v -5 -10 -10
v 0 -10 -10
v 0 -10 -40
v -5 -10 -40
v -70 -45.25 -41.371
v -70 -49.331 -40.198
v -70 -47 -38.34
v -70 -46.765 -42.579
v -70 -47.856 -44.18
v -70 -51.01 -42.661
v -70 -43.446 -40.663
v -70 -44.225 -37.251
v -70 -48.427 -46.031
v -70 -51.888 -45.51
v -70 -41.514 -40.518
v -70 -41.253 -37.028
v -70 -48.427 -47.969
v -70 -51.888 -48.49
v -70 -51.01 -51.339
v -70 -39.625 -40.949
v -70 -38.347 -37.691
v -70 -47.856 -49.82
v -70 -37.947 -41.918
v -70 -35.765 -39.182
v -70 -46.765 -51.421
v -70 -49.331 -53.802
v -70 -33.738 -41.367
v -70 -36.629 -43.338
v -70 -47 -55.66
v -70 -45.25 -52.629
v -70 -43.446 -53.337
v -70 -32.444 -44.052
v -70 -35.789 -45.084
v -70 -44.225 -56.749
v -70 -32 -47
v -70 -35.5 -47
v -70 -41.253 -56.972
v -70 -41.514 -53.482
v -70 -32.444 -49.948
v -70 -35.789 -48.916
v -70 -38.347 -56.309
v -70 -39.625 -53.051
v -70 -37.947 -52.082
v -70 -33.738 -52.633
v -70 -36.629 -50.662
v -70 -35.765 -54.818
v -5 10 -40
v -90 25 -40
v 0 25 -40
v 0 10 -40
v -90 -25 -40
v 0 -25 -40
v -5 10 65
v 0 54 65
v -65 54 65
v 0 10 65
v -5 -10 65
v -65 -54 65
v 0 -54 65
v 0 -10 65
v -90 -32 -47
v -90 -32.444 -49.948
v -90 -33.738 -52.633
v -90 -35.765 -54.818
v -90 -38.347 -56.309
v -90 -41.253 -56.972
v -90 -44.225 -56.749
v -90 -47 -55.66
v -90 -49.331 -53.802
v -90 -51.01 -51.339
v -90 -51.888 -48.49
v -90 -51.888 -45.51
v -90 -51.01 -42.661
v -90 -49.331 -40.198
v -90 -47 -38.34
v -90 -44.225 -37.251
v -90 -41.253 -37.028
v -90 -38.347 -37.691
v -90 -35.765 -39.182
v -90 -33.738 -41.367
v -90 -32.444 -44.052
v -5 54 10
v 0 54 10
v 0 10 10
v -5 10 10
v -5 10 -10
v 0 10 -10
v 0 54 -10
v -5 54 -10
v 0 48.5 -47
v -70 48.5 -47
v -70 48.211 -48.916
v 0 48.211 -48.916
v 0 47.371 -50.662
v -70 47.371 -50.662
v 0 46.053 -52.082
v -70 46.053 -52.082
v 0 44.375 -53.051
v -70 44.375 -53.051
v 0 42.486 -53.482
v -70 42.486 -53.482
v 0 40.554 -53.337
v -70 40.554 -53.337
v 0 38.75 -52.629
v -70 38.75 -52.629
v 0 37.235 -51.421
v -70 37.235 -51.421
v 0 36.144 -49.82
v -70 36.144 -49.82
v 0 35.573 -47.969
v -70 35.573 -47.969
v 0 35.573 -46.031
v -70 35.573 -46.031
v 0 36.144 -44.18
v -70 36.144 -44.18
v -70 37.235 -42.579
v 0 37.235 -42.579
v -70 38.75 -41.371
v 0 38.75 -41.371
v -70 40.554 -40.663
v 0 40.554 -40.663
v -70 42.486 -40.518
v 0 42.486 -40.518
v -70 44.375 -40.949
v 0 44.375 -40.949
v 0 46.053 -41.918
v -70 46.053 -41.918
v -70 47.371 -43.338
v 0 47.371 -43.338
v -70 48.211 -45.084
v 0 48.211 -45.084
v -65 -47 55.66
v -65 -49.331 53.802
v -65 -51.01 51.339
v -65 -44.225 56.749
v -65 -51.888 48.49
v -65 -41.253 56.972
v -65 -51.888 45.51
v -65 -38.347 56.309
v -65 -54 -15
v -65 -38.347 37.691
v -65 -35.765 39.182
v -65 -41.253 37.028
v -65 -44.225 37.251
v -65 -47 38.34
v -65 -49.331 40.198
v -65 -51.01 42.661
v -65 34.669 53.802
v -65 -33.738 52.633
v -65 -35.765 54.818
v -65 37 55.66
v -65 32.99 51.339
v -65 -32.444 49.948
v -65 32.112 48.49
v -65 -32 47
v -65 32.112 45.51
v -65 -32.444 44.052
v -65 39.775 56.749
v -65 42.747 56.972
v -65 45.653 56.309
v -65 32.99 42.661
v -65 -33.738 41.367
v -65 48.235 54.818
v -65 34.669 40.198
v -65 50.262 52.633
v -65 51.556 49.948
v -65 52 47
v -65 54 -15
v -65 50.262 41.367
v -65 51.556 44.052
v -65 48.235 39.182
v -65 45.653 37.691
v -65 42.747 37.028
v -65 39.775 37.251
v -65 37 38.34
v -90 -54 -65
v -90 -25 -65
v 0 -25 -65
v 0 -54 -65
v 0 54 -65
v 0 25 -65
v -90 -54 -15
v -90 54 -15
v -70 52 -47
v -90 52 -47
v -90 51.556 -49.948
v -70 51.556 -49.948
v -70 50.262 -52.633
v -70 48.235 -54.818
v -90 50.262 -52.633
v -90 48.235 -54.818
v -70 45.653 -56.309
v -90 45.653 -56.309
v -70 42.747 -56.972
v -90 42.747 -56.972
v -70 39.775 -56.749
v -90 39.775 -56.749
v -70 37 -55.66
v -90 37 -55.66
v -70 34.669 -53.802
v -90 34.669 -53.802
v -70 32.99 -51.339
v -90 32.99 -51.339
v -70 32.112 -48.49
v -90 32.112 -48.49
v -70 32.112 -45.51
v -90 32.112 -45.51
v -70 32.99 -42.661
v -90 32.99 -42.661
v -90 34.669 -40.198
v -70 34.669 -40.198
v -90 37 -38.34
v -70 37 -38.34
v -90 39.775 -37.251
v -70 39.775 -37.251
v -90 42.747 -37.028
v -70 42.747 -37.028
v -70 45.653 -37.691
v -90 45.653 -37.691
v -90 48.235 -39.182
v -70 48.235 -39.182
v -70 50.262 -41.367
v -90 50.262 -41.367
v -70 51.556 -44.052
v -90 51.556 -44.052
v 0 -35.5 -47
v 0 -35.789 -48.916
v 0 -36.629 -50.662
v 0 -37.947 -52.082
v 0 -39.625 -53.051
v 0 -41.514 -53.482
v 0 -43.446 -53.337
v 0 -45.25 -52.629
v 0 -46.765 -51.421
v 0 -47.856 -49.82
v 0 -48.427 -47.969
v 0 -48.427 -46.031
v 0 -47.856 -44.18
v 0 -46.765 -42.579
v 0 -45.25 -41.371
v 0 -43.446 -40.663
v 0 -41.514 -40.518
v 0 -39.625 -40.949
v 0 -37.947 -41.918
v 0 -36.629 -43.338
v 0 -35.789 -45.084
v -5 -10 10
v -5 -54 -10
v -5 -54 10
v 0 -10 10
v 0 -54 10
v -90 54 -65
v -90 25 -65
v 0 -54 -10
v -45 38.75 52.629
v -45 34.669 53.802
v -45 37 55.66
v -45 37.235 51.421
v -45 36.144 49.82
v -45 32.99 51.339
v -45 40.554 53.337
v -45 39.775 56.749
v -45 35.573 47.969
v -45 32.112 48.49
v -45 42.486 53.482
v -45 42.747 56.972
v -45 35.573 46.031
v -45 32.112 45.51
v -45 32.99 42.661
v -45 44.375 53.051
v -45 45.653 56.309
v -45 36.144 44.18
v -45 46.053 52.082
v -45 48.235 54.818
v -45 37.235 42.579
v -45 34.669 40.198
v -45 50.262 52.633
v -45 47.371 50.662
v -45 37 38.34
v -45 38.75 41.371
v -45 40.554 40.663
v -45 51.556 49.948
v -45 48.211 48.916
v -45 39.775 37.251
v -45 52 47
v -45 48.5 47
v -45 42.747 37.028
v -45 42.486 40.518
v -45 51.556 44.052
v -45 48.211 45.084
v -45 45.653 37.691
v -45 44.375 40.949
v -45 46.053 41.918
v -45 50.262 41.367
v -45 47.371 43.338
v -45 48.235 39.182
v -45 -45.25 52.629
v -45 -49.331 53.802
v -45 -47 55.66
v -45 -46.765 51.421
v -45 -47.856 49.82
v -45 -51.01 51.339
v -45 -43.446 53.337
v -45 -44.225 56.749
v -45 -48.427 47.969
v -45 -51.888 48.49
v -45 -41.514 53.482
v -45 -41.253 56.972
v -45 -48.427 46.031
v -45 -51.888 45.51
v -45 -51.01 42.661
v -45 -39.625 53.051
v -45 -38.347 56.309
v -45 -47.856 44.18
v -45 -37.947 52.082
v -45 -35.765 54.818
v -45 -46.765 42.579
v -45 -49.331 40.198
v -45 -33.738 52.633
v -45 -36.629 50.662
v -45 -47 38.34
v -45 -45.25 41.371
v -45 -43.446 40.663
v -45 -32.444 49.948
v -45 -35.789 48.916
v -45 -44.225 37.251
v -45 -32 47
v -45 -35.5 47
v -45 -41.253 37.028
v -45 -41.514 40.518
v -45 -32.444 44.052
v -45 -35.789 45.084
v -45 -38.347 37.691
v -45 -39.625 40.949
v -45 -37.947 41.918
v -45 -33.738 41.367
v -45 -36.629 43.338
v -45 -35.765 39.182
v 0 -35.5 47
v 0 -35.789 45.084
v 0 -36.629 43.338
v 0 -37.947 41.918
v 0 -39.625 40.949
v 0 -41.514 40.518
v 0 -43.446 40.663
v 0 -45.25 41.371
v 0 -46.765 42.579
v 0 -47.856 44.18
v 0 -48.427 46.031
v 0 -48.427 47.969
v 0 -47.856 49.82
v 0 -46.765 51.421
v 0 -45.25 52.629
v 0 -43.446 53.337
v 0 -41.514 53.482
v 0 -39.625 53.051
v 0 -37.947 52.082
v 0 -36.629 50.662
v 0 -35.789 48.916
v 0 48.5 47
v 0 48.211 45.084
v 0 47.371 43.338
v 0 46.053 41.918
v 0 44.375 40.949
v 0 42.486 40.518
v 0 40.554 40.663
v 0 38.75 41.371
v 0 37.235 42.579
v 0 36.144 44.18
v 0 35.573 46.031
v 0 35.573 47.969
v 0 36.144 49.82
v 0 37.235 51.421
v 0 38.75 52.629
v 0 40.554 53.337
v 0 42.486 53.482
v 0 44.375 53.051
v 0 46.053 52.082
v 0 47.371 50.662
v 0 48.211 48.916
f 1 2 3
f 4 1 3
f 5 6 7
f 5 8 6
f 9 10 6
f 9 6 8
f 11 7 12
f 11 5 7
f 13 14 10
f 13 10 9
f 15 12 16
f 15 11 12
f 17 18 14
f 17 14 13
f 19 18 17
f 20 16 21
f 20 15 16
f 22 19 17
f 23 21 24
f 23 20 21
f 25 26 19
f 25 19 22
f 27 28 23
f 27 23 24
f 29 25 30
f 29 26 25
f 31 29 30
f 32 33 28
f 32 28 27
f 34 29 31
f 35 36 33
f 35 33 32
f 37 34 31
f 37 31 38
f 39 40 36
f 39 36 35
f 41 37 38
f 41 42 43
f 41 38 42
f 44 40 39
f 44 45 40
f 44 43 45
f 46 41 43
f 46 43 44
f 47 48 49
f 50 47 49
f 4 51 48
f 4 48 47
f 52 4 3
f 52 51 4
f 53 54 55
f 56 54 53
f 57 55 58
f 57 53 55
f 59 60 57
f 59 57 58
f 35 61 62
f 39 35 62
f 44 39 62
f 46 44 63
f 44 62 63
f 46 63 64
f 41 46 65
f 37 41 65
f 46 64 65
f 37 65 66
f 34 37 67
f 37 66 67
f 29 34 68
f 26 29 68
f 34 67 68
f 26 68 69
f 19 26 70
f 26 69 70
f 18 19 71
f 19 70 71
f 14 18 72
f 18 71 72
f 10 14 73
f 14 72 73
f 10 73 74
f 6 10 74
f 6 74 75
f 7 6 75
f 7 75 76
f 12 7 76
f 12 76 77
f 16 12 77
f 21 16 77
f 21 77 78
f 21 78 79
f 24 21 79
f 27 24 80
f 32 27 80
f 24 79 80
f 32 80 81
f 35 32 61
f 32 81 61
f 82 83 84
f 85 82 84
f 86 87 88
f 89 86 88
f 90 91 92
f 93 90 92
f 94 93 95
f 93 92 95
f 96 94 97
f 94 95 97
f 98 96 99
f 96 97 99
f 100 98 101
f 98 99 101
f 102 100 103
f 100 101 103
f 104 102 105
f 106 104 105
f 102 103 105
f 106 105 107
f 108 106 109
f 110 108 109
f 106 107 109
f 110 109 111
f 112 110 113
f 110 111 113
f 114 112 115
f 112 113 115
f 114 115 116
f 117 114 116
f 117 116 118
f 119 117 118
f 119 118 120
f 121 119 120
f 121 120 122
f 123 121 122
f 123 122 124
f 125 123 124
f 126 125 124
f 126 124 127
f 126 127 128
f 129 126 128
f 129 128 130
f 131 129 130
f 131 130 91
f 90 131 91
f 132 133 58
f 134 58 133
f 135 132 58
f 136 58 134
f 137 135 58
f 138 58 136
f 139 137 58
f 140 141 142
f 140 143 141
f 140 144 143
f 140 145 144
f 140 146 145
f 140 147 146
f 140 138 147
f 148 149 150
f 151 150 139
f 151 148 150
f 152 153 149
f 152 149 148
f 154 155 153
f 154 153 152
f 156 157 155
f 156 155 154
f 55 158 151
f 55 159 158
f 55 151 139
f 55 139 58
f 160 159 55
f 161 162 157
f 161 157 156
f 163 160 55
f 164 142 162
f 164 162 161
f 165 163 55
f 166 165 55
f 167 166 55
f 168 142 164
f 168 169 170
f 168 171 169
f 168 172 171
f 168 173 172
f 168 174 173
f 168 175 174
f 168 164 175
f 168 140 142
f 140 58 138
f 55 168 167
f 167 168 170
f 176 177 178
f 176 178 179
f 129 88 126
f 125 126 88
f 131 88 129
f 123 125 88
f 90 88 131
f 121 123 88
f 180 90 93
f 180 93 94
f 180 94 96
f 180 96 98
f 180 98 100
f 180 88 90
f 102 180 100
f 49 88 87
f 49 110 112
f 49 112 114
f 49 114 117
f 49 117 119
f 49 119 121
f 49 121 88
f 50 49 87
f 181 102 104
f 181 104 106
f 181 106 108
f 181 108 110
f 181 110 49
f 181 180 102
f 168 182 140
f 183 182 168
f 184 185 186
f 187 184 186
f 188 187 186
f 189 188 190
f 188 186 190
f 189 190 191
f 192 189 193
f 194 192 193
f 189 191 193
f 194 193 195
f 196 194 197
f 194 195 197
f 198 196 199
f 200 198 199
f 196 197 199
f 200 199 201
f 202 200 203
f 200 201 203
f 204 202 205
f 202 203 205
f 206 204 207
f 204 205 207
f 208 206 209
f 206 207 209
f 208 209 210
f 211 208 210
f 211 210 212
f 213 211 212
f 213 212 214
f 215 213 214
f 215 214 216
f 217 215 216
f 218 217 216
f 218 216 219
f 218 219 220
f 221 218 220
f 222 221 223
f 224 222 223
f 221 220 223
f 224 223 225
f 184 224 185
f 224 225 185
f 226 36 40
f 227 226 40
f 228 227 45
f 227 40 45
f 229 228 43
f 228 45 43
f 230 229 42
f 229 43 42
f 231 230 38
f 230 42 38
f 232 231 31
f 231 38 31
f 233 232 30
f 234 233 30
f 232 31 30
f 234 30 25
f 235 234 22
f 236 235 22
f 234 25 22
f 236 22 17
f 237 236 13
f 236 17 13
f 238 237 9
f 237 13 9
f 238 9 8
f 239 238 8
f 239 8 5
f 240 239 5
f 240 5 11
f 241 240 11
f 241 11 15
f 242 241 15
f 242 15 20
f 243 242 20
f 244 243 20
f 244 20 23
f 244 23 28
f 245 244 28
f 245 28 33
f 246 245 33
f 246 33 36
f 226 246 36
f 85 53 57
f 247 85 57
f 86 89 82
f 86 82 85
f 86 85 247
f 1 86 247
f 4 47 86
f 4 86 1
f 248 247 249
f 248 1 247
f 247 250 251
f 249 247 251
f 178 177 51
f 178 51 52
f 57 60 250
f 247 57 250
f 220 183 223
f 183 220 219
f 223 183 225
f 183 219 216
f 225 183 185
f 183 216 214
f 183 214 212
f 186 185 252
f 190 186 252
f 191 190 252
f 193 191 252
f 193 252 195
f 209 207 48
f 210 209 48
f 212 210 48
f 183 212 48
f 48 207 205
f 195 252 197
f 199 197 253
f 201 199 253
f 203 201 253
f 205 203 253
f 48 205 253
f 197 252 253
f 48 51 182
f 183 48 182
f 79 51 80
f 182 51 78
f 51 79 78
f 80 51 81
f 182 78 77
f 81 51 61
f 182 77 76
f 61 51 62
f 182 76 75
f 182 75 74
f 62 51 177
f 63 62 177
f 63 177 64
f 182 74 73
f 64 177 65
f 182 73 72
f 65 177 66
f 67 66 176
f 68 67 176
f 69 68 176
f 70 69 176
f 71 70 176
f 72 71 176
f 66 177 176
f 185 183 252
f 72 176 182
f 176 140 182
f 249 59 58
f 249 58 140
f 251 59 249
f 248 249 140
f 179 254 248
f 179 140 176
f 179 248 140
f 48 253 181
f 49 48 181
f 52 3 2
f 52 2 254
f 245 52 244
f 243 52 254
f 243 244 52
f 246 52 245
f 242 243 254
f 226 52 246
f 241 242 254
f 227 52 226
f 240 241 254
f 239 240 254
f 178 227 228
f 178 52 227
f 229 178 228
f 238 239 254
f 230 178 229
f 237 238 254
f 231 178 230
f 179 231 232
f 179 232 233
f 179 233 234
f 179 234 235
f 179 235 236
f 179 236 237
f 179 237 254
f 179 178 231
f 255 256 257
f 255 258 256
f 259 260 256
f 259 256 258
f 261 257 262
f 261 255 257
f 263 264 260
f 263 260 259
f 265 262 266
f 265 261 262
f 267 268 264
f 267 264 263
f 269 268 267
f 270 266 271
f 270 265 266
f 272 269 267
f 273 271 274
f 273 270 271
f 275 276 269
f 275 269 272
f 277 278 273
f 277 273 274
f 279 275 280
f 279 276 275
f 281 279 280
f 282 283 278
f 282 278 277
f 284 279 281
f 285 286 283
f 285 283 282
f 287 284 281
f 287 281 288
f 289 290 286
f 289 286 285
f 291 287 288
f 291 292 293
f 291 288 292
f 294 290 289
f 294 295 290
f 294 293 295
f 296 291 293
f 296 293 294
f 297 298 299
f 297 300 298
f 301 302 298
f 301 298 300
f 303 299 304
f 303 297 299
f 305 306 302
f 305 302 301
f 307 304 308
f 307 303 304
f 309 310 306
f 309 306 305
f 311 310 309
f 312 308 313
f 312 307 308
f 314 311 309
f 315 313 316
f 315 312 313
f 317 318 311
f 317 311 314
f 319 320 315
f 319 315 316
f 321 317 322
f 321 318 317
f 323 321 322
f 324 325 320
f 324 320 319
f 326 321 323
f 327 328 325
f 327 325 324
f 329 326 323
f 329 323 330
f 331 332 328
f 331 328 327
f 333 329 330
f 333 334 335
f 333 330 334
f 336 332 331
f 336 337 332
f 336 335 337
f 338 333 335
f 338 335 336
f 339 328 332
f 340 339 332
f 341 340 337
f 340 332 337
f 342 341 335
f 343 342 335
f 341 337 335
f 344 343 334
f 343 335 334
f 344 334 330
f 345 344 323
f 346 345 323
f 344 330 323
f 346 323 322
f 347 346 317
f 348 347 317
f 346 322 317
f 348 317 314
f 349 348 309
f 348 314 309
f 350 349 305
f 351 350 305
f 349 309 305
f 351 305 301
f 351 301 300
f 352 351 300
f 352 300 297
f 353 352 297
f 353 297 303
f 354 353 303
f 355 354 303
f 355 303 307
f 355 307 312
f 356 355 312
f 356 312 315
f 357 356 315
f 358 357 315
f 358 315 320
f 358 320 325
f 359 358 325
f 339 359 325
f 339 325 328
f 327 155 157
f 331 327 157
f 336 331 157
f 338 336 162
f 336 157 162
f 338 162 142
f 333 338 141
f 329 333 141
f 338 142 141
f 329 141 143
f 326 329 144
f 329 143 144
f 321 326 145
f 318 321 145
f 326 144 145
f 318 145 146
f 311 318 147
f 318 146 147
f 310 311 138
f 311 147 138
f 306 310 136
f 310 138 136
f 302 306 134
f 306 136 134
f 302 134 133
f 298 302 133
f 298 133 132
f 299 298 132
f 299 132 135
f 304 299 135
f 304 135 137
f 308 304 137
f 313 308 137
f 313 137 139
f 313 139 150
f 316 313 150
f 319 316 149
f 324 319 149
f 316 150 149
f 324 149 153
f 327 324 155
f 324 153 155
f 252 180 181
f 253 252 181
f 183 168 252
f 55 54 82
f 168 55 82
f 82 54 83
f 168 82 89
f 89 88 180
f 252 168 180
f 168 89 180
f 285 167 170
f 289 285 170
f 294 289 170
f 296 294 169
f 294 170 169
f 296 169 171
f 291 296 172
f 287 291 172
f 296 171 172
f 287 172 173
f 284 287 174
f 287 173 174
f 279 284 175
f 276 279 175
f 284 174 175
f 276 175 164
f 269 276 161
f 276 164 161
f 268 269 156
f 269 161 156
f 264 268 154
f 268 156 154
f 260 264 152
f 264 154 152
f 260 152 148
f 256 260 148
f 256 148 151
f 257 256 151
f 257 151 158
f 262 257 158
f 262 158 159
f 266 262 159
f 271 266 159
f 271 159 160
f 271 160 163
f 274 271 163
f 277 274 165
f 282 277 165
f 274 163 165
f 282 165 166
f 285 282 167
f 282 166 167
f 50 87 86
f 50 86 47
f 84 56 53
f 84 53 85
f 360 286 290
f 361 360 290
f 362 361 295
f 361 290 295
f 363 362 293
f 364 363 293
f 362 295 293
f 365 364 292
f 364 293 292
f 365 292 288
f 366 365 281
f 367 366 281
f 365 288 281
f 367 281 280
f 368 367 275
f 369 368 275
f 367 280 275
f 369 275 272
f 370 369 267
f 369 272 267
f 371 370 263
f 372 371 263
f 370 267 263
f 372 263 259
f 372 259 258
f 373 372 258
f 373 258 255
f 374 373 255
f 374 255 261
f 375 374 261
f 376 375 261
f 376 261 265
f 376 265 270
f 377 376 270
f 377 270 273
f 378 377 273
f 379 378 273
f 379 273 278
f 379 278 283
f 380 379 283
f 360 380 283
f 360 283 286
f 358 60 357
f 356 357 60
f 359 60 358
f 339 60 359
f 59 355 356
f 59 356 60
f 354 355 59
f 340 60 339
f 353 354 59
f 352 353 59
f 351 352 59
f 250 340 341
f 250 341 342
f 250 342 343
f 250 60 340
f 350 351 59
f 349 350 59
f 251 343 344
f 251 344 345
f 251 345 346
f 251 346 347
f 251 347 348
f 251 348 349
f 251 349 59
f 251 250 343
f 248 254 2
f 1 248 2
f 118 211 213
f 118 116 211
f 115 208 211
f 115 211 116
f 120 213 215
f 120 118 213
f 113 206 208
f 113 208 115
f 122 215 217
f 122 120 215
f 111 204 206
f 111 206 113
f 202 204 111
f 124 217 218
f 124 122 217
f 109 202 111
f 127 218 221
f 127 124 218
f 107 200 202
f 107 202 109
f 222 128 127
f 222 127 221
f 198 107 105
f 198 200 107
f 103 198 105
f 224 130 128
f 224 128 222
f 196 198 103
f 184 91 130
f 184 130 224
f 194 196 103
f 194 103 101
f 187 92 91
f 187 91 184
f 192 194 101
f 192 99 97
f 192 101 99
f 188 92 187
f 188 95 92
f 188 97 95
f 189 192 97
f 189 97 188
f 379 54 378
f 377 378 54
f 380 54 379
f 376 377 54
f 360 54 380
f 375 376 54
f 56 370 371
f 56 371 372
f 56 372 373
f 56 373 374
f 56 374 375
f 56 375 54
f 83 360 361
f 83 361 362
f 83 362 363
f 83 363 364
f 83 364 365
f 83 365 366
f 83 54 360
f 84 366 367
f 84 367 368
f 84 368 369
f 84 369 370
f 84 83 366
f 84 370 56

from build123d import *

# Parameters (mm, degrees)
F0_W      = 108
F0_H      = 130
F1_DEPTH  = 90
F2_R      = 6.5
F3_DEPTH  = 90.001
F4_W      = 108
F4_H      = 80
F5_DEPTH  = 25
F6_W      = 90
F6_H      = 50
F7_DEPTH  = 25
F8_R      = 10
F9_DEPTH  = 20
F10_R     = 10
F11_DEPTH = 20
F12_W     = 20
F12_H     = 55
F12_W_2   = 44
F12_H_2   = 20
F13_DEPTH = 5
F15_ANGLE = 180


with BuildPart() as f1:
    # F0 (on Right) → F1 (new body)
    with BuildSketch(Plane.YZ):
        Rectangle(F0_W, F0_H)
    extrude(amount=-F1_DEPTH)

    # F2 (on face) → F3 (cut, through all)
    with BuildSketch(Plane(origin=(-90, 0, 0), x_dir=(0, -1, 0), z_dir=(-1, 0, 0))):
        with Locations((-42, 47)):
            Circle(F2_R)
        with Locations((42, 47)):
            Circle(F2_R)
        with Locations((-42, -47)):
            Circle(F2_R)
        with Locations((42, -47)):
            Circle(F2_R)
    extrude(amount=-F3_DEPTH, mode=Mode.SUBTRACT)

    # F4 (on face) → F5 (cut)
    with BuildSketch(Plane(origin=(-90, 0, 0), x_dir=(0, -1, 0), z_dir=(-1, 0, 0))):
        with Locations((0, -25)):
            Rectangle(F4_W, F4_H)
    extrude(amount=-F5_DEPTH, mode=Mode.SUBTRACT)

    # F6 (on face) → F7 (cut)
    with BuildSketch(Plane.XY.offset(65)):
        with Locations((-45, 0)):
            Rectangle(F6_W, F6_H)
    extrude(amount=-F7_DEPTH, mode=Mode.SUBTRACT)

    # F8 (on face) → F9 (cut)
    with BuildSketch(Plane(origin=(-65, 0, 0), x_dir=(0, -1, 0), z_dir=(-1, 0, 0))):
        with Locations((42, -47)):
            Circle(F8_R)
        with Locations((-42, -47)):
            Circle(F8_R)
    extrude(amount=-F9_DEPTH, mode=Mode.SUBTRACT)

    # F10 (on face) → F11 (cut)
    with BuildSketch(Plane(origin=(-90, 0, 0), x_dir=(0, -1, 0), z_dir=(-1, 0, 0))):
        with Locations((42, 47)):
            Circle(F10_R)
        with Locations((-42, 47)):
            Circle(F10_R)
    extrude(amount=-F11_DEPTH, mode=Mode.SUBTRACT)

    # F12 (on face) → F13 (cut)
    with BuildSketch(Plane.YZ):
        with Locations((0, -37.5)):
            Rectangle(F12_W, F12_H)
        with Locations((-32, 0)):
            Rectangle(F12_W_2, F12_H_2)
        Rectangle(F12_W, F12_H_2)
        with Locations((32, 0)):
            Rectangle(F12_W_2, F12_H_2)
        with Locations((0, 37.5)):
            Rectangle(F12_W, F12_H)
    extrude(amount=-F13_DEPTH, mode=Mode.SUBTRACT)


with BuildPart() as f1_1:
    # F15: moved
    add(f1.part.rotate(Axis((42.7994653583, 0, 0), (1, 0, 0)), F15_ANGLE))


solid = f1_1.part
